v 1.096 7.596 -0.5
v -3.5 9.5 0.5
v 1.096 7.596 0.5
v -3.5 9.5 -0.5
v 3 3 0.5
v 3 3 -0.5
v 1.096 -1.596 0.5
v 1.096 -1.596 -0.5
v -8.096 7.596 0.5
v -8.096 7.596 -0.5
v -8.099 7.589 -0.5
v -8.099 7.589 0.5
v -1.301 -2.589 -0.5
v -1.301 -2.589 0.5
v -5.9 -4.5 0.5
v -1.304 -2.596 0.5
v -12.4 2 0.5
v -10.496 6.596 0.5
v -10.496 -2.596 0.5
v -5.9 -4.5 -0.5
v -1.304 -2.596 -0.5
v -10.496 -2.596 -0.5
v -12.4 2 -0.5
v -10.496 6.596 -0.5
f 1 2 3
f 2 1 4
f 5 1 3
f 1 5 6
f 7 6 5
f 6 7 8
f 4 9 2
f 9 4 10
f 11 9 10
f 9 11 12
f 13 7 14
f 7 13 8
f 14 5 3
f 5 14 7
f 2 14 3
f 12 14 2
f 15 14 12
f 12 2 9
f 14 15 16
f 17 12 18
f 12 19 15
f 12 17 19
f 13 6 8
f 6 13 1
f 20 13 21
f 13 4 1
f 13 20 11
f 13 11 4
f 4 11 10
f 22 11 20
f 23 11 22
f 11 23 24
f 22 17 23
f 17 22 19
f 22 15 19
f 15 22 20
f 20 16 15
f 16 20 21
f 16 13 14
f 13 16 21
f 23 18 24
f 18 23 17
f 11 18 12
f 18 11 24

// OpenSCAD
//Question 7
color("#67B7D1"){
        translate([-3.5, 3, 0])
            cylinder(r=6.5, h=1, $fn=8, center = true);

        translate([-5.9, 2, 0])
            cylinder(r=6.5, h=1, $fn=8, center = true);

}
